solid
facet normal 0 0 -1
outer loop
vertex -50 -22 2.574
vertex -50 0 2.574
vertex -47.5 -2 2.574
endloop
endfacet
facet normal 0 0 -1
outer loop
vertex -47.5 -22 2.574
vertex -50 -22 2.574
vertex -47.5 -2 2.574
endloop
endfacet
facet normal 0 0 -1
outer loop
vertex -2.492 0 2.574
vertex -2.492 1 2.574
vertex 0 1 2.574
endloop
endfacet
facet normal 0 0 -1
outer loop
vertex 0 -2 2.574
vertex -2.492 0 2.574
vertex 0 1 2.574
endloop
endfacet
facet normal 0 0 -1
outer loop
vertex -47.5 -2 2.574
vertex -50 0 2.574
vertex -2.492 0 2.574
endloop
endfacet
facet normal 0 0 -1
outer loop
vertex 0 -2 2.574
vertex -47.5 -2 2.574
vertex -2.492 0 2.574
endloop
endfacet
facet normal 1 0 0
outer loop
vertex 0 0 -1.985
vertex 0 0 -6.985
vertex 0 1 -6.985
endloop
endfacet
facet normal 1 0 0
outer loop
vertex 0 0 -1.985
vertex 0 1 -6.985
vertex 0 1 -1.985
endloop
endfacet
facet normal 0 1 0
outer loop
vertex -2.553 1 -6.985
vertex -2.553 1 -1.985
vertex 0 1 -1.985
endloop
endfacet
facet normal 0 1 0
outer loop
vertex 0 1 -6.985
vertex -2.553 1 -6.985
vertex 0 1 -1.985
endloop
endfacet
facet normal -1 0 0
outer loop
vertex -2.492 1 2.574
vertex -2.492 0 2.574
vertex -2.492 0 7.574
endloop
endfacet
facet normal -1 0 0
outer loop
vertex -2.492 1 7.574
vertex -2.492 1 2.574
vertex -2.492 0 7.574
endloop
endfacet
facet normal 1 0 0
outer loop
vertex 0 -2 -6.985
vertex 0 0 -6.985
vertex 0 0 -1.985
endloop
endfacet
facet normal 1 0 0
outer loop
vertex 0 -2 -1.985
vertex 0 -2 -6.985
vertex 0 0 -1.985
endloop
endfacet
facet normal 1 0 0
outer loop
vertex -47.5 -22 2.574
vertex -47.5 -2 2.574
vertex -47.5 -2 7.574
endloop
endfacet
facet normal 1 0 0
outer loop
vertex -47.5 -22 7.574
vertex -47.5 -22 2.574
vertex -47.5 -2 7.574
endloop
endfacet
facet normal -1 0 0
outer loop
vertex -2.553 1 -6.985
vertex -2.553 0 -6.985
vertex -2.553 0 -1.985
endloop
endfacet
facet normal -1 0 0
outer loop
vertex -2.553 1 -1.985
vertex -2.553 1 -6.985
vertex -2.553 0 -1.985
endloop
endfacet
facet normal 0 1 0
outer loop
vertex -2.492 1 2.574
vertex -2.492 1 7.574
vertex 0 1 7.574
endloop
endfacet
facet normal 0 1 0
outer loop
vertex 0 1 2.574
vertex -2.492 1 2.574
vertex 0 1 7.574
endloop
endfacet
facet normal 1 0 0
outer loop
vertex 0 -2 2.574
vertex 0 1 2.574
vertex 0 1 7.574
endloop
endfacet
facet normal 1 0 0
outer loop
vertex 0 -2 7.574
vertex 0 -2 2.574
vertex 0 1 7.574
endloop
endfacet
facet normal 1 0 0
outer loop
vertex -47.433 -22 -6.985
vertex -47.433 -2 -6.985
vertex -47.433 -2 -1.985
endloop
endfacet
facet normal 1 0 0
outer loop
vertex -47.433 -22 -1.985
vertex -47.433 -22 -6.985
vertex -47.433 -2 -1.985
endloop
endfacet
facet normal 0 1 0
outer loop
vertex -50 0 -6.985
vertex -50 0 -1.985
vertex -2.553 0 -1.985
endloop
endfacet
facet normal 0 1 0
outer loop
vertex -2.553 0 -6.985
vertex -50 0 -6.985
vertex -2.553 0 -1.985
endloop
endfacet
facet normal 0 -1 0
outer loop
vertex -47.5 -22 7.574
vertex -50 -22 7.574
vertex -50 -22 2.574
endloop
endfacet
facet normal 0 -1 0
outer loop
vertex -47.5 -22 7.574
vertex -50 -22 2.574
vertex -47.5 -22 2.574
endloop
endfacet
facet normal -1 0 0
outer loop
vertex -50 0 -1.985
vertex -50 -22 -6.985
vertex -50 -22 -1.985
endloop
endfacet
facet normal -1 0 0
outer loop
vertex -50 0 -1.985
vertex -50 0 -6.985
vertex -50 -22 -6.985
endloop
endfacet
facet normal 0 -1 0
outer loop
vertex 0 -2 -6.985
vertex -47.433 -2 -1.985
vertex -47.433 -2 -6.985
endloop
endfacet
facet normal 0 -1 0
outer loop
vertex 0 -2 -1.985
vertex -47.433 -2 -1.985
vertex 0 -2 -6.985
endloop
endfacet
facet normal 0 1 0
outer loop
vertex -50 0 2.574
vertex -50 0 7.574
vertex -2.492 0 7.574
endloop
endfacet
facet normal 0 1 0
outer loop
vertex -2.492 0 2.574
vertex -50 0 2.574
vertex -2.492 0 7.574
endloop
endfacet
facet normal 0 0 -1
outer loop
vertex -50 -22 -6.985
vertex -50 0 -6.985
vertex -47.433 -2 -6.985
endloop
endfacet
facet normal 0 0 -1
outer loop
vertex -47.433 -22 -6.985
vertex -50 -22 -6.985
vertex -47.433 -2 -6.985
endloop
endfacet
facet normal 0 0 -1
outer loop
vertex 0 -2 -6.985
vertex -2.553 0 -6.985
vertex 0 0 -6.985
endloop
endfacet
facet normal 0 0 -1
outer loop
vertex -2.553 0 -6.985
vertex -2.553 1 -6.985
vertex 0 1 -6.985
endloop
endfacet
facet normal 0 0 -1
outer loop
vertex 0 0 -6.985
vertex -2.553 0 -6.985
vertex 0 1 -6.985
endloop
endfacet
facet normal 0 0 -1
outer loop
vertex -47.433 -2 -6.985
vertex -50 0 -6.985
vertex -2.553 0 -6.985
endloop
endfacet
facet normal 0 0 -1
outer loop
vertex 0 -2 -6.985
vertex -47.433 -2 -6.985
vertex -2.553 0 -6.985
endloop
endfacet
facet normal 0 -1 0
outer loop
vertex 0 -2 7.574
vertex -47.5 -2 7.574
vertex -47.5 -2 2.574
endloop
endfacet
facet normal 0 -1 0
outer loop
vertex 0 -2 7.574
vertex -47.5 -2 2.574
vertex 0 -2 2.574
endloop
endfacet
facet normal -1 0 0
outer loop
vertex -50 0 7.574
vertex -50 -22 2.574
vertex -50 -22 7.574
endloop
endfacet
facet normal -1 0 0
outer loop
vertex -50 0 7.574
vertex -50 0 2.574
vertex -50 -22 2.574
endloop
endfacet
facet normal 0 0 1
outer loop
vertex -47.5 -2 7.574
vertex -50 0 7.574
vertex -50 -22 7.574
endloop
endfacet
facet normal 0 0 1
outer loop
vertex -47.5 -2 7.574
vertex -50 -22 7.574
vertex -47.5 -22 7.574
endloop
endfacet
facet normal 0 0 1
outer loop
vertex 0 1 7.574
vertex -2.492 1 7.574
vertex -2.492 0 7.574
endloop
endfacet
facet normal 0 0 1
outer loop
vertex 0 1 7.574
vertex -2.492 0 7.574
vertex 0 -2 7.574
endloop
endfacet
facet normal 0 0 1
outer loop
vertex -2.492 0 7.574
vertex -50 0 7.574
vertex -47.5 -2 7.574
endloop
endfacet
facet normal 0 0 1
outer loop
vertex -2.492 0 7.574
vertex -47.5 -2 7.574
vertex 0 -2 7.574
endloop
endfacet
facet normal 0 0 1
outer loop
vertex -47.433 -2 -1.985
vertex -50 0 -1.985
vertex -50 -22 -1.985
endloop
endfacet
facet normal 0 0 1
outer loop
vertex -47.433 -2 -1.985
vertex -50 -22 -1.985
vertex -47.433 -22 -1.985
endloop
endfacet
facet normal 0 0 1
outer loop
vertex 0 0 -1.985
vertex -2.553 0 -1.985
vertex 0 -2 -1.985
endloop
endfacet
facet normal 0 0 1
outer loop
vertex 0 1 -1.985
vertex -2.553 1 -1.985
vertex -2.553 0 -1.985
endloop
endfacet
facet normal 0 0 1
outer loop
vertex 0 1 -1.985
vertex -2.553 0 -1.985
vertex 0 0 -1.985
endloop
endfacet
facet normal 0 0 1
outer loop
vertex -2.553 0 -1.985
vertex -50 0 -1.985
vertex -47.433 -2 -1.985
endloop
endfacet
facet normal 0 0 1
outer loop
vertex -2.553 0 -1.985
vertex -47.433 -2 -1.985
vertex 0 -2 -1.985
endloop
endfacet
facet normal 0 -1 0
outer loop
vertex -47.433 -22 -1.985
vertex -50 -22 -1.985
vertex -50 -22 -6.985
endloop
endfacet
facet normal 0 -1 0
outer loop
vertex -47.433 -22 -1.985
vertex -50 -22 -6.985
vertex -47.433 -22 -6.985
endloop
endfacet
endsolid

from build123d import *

# Parameters (mm, degrees)
F0_W     = 50
F0_H     = 5
F1_DEPTH = 2
F2_W     = 2.5
F2_H     = 5
F3_DEPTH = 20
F4_W     = 2.566858
F4_H     = 5
F5_DEPTH = 20
F6_W     = 2.49176
F6_H     = 5
F7_DEPTH = 3
F8_W     = 2.553163
F8_H     = 5
F9_DEPTH = 3


with BuildPart() as f1:
    # F0 (on Front) → F1 (new body)
    with BuildSketch(Plane.XZ):
        with Locations((-25, 5.07353)):
            Rectangle(F0_W, F0_H)
        with Locations((-25, -4.485294)):
            Rectangle(F0_W, F0_H)
    extrude(amount=F1_DEPTH)

    # F2 (on face) → F3 (join)
    with BuildSketch(Plane.XZ.offset(2)):
        with Locations((-48.75, 5.07353)):
            Rectangle(F2_W, F2_H)
    extrude(amount=F3_DEPTH)

    # F4 (on face) → F5 (join)
    with BuildSketch(Plane.XZ.offset(2)):
        with Locations((-48.716571, -4.485294)):
            Rectangle(F4_W, F4_H)
    extrude(amount=F5_DEPTH)

    # F6 (on face) → F7 (join)
    with BuildSketch(Plane.XZ.offset(2)):
        with Locations((-1.24588, 5.07353)):
            Rectangle(F6_W, F6_H)
    extrude(amount=-F7_DEPTH)

    # F8 (on face) → F9 (join)
    with BuildSketch(Plane.XZ.offset(2)):
        with Locations((-1.276582, -4.485294)):
            Rectangle(F8_W, F8_H)
    extrude(amount=-F9_DEPTH)


solid = f1.part
